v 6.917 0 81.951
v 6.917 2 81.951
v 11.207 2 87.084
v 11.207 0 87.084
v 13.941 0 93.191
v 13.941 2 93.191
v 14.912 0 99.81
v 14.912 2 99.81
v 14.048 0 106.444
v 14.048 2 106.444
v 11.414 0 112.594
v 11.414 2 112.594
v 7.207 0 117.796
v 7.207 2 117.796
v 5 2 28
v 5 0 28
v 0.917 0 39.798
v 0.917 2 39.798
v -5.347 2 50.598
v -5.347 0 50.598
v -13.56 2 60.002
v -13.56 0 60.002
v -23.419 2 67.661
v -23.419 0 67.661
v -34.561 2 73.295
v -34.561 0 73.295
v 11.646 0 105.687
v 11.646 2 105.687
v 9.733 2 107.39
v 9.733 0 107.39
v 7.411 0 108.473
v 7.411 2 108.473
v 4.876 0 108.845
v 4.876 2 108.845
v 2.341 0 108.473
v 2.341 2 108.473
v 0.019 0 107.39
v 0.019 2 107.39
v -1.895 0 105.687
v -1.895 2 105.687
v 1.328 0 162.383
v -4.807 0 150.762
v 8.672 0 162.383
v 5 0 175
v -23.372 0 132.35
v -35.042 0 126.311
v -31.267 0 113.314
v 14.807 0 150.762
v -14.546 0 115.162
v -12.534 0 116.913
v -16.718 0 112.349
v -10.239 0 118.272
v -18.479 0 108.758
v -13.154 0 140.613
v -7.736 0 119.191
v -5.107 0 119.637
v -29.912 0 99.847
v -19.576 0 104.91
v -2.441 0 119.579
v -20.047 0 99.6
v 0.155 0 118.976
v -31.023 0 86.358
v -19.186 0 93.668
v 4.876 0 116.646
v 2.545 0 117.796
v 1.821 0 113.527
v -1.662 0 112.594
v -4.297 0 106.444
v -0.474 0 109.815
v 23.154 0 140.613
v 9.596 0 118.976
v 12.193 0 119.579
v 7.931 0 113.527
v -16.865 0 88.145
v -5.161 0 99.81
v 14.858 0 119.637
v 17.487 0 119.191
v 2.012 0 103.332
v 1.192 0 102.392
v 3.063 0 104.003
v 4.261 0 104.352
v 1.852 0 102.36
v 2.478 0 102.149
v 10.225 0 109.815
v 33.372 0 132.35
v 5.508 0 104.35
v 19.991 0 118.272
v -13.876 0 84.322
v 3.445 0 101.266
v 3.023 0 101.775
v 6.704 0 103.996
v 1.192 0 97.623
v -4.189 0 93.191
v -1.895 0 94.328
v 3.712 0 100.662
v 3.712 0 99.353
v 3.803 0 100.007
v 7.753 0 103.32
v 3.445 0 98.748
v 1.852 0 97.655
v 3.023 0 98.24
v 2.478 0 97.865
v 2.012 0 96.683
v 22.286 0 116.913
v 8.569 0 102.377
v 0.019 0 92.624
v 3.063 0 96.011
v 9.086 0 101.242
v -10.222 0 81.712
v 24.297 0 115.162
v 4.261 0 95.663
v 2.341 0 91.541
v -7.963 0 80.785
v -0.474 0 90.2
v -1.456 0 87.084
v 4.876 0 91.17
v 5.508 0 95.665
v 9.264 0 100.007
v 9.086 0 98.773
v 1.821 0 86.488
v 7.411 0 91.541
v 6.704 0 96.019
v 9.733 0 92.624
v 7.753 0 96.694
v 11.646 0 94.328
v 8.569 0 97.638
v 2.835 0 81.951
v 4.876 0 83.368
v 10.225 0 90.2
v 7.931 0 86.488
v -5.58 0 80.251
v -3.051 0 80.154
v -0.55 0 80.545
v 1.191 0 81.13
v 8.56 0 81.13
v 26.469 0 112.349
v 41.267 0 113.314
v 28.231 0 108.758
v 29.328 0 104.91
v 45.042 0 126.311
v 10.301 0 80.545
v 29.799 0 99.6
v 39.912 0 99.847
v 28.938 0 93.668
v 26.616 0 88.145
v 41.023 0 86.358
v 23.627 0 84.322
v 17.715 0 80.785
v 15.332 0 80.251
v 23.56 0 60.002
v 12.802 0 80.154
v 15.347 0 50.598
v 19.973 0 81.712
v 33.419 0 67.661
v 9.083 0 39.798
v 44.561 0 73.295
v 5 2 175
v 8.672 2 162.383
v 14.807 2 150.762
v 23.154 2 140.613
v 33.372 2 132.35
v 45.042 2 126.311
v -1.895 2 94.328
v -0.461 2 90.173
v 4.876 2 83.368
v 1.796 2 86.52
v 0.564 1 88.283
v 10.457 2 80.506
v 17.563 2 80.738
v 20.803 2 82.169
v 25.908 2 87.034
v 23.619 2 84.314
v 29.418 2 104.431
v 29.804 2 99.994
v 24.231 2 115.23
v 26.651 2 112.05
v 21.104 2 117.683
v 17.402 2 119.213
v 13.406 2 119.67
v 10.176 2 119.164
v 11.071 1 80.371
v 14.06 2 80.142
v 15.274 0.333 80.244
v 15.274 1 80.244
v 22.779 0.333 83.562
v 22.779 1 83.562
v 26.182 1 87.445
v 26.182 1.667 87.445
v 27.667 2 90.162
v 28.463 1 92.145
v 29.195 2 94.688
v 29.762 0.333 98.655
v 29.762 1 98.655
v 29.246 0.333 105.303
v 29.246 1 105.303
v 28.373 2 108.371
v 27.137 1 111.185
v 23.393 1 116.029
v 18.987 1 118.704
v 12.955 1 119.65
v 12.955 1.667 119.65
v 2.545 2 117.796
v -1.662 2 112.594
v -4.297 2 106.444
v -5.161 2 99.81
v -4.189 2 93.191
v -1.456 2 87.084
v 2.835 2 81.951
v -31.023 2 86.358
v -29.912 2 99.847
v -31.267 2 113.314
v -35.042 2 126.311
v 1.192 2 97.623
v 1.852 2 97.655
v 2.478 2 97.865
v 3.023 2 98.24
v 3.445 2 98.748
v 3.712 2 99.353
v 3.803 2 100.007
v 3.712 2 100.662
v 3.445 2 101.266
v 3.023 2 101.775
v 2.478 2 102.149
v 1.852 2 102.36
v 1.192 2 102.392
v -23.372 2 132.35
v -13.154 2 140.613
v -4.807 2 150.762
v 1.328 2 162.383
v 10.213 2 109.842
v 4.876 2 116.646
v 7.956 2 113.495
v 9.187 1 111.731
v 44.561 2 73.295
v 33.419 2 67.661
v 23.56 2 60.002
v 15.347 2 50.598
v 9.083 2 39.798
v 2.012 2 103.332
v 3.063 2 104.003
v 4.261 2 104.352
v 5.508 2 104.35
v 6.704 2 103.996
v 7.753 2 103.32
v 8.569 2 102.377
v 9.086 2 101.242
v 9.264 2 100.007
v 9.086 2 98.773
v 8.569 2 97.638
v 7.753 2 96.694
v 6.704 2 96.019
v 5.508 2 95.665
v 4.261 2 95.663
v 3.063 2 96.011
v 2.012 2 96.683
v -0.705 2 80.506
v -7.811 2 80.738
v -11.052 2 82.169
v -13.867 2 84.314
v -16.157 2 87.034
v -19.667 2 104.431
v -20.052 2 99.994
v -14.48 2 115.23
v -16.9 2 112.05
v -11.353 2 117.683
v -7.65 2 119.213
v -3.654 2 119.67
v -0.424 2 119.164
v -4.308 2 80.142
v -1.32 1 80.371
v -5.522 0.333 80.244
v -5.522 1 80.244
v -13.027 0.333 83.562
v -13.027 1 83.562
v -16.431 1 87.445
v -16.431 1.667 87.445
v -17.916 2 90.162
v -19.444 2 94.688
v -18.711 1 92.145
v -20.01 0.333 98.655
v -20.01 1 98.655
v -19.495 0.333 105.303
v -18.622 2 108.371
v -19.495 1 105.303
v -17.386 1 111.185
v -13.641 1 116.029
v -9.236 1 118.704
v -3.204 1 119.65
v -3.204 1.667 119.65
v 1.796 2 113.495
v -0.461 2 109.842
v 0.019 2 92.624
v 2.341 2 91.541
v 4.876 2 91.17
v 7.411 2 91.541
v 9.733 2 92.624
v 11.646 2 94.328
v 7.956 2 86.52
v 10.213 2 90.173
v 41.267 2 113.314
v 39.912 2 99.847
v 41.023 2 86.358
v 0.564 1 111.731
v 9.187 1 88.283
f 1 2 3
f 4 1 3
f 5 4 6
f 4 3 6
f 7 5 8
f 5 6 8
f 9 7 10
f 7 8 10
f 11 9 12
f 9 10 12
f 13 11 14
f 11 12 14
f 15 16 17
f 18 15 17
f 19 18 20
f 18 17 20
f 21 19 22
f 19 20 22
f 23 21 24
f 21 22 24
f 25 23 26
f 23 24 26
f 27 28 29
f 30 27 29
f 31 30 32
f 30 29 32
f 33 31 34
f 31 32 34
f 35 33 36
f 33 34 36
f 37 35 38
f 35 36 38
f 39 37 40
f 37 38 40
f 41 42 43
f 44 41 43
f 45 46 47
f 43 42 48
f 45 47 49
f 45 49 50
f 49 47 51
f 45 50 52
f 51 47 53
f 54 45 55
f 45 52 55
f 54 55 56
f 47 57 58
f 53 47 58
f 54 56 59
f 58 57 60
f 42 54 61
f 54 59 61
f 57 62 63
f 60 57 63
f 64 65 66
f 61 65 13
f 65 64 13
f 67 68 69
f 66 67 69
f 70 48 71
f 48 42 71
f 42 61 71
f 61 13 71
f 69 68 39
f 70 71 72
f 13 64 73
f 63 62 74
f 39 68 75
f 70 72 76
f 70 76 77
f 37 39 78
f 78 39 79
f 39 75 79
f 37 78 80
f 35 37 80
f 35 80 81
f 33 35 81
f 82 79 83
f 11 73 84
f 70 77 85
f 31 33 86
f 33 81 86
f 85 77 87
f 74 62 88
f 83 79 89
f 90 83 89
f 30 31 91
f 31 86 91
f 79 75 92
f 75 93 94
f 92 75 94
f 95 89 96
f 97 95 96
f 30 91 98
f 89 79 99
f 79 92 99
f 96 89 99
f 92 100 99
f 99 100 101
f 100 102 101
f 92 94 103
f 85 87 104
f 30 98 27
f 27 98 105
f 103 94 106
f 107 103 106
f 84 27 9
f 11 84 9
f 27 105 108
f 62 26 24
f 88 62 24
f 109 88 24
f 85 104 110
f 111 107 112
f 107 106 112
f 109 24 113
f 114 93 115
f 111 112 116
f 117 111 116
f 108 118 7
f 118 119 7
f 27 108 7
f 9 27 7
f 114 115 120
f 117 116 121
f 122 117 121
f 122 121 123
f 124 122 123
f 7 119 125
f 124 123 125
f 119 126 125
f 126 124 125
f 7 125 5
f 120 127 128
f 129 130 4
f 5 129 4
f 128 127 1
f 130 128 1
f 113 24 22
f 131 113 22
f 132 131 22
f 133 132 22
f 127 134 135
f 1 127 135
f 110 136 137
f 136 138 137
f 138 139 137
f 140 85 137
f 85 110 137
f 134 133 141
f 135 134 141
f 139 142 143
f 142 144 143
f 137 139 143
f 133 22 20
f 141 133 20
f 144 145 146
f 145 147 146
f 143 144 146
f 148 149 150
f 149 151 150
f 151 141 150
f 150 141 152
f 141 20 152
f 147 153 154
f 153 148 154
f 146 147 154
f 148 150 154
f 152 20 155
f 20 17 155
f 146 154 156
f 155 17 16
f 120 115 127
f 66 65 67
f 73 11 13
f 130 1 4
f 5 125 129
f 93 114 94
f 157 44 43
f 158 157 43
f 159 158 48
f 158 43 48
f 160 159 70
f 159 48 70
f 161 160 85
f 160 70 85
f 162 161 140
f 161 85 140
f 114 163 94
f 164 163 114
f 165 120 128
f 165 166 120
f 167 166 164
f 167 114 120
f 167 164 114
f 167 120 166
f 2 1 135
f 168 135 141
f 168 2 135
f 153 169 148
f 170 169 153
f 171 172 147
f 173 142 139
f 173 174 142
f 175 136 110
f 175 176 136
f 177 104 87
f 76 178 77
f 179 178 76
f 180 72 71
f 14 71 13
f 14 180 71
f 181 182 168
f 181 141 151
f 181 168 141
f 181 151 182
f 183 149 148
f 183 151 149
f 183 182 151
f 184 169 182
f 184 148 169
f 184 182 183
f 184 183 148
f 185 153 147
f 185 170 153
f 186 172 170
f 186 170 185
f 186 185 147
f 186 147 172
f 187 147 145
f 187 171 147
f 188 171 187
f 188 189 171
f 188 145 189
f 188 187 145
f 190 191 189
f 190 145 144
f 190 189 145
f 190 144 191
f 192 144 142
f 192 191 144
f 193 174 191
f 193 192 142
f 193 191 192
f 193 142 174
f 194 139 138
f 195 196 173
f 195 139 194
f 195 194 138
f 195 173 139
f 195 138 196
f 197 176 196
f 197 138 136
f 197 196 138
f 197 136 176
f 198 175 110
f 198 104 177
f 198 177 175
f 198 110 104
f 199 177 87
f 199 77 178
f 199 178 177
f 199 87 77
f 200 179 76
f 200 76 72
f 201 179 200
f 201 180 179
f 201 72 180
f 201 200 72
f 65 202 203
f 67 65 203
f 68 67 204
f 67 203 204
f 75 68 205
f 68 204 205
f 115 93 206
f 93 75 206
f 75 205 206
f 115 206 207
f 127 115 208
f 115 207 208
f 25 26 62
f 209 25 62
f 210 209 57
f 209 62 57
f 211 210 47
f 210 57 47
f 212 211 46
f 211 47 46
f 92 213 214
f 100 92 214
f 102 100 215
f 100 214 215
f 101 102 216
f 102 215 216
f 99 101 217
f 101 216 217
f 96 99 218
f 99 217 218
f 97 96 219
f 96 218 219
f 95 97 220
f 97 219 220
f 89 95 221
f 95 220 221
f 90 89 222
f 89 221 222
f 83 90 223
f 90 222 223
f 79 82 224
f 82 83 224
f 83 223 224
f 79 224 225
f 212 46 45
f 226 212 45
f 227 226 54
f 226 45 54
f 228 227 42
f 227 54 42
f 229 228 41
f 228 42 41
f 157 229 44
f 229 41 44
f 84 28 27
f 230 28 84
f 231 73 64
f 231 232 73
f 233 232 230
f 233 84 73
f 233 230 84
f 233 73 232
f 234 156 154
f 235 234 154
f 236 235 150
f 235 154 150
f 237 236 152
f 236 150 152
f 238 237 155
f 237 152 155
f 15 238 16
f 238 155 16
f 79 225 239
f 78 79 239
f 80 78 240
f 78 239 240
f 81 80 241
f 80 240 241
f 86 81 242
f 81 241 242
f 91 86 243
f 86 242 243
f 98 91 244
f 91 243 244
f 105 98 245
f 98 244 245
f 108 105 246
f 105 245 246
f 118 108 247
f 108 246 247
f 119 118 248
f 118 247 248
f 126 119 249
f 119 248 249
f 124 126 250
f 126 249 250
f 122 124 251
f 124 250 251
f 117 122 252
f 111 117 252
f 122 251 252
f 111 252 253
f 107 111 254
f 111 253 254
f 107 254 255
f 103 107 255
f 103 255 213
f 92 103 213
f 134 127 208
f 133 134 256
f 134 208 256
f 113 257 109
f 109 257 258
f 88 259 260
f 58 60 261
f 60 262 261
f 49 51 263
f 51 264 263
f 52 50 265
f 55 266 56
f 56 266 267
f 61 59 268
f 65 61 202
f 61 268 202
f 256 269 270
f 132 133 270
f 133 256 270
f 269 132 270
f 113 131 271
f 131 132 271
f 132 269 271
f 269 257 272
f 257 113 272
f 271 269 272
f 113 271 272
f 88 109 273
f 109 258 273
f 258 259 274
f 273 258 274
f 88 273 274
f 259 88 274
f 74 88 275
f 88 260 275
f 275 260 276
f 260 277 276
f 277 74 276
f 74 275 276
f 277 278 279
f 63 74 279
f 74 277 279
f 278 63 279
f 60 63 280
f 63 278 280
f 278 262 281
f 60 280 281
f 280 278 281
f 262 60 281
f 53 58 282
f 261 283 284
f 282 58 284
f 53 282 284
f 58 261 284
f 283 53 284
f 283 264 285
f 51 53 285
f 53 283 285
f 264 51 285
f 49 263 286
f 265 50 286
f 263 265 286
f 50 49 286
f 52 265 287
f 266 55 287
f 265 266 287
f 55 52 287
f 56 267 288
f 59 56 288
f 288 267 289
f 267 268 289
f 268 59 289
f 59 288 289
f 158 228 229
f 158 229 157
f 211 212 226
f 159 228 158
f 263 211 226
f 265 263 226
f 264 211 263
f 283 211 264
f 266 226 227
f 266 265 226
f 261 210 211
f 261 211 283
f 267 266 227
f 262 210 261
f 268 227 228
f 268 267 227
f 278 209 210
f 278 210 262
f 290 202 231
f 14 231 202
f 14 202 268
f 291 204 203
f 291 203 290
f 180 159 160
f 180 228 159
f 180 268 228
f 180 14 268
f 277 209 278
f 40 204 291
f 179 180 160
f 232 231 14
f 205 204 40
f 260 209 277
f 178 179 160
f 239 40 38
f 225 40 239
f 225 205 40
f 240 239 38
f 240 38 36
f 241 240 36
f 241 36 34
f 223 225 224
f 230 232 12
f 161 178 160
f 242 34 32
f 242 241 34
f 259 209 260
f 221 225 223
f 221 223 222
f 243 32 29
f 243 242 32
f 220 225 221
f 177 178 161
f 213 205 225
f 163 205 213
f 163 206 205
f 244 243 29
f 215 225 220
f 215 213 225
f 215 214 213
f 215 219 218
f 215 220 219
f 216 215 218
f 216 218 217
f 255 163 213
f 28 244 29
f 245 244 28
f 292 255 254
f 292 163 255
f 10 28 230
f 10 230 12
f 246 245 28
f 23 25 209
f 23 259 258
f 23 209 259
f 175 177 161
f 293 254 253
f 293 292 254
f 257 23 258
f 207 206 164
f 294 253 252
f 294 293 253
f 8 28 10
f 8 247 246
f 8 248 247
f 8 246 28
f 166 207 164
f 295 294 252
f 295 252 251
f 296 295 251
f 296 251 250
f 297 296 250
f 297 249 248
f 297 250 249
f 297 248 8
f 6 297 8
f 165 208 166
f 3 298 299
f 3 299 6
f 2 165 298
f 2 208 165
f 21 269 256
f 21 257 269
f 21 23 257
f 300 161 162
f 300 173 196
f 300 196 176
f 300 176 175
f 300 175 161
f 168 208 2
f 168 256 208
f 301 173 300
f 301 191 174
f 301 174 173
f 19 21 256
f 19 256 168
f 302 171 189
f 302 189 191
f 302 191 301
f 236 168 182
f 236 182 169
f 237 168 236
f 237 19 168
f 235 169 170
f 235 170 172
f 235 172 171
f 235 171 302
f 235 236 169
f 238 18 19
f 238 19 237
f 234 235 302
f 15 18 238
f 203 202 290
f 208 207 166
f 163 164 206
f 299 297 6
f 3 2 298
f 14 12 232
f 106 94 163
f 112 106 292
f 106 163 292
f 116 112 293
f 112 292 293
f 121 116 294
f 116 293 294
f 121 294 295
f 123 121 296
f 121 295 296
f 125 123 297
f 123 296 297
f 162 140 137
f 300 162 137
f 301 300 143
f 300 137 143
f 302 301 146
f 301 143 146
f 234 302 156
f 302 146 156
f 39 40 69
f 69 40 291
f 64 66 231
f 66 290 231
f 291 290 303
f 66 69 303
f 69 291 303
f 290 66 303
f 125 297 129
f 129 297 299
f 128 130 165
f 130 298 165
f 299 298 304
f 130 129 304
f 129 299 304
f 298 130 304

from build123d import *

# Parameters (mm, degrees)
EXTRUDE_1_DEPTH     = 2
CUT_EXTRUDE_2_DEPTH = 3


with BuildPart() as part:
    # Эскиз2 → Бобышка-Вытянуть1 (new body)
    with BuildSketch(Plane(origin=(0, 0, 0), x_dir=(1, 0, 0), z_dir=(0, 1, 0))):
        with BuildLine():
            ThreePointArc((-34.560822595, -73.294650793), (-29.912438938, -99.847233064), (-35.042219755, -126.311028042))
            ThreePointArc((-35.042219755, -126.311028042), (-8.723554926, -145.4763519), (4.999999999, -175))
            ThreePointArc((4.999999999, -175), (18.723554924, -145.4763519), (45.042219753, -126.311028042))
            ThreePointArc((45.042219753, -126.311028042), (39.912438936, -99.847233064), (44.560822593, -73.294650793))
            ThreePointArc((44.560822593, -73.294650793), (19.227048475, -55.497690672), (4.999999999, -28))
            ThreePointArc((4.999999999, -28), (-9.227048477, -55.497690672), (-34.560822595, -73.294650793))
        make_face()
    extrude(amount=EXTRUDE_1_DEPTH)

    # Эскиз5 → Вырез-Вытянуть2 (cut, through all)
    with BuildSketch(Plane(origin=(0, 2, 0), x_dir=(1, 0, 0), z_dir=(0, 1, 0))):
        with BuildLine():
            ThreePointArc((1.1922114, -102.391848867), (9.263771174, -100.007354542), (1.1922114, -97.622860217))
            ThreePointArc((1.1922114, -97.622860217), (3.802790428, -100.007354542), (1.1922114, -102.391848867))
        make_face()
        with BuildLine():
            ThreePointArc((-1.894766012, -94.327614743), (4.875778497, -91.169950109), (11.646323005, -94.327614743))
            add(Edge.make_bspline(
                [(11.646323005, -94.327614743), (10.113303771, -87.718633088), (4.875778497, -83.368495621)],
                knots=[0, 0, 0, 1, 1, 1], degree=2))
            add(Edge.make_bspline(
                [(-1.894766012, -94.327614743), (-0.361746778, -87.718633088), (4.875778497, -83.368495621)],
                knots=[0, 0, 0, 1, 1, 1], degree=2))
        make_face()
        with BuildLine():
            add(Edge.make_bspline(
                [(11.646323005, -105.687094341), (10.113303771, -112.296075996), (4.875778497, -116.646213463)],
                knots=[0, 0, 0, 1, 1, 1], degree=2))
            ThreePointArc((11.646323005, -105.687094341), (4.875778497, -108.844758976), (-1.894766012, -105.687094341))
            add(Edge.make_bspline(
                [(-1.894766012, -105.687094341), (-0.361746778, -112.296075996), (4.875778497, -116.646213463)],
                knots=[0, 0, 0, 1, 1, 1], degree=2))
        make_face()
        with BuildLine():
            ThreePointArc((6.916781621, -81.95103194), (14.912317424, -99.810070996), (7.206797889, -117.796144427))
            add(Edge.make_bspline(
                [(6.916781621, -81.95103194), (12.307611516, -78.787526654), (22.389316178, -80.793310488), (29.731357531, -92.811077081), (30.434704422, -105.116682284), (25.64381117, -115.001664232), (17.091486552, -120.227210357), (10.646188457, -120.056173748), (7.206797889, -117.796144427)],
                knots=[0, 0, 0, 0, 0.238043411, 0.386081267, 0.575651621, 0.751375083, 0.825495316, 1, 1, 1, 1], degree=3))
        make_face()
        with BuildLine():
            ThreePointArc((2.544759104, -117.796144427), (-5.160760431, -99.810070996), (2.834775372, -81.95103194))
            add(Edge.make_bspline(
                [(2.834775372, -81.95103194), (-2.556054523, -78.787526654), (-12.637759184, -80.793310488), (-19.979800538, -92.811077081), (-20.683147428, -105.116682284), (-15.892254177, -115.001664232), (-7.339929559, -120.227210357), (-0.894631464, -120.056173748), (2.544759104, -117.796144427)],
                knots=[0, 0, 0, 0, 0.238043411, 0.386081267, 0.575651621, 0.751375083, 0.825495316, 1, 1, 1, 1], degree=3))
        make_face()
    extrude(amount=-CUT_EXTRUDE_2_DEPTH, mode=Mode.SUBTRACT)


solid = part.part
